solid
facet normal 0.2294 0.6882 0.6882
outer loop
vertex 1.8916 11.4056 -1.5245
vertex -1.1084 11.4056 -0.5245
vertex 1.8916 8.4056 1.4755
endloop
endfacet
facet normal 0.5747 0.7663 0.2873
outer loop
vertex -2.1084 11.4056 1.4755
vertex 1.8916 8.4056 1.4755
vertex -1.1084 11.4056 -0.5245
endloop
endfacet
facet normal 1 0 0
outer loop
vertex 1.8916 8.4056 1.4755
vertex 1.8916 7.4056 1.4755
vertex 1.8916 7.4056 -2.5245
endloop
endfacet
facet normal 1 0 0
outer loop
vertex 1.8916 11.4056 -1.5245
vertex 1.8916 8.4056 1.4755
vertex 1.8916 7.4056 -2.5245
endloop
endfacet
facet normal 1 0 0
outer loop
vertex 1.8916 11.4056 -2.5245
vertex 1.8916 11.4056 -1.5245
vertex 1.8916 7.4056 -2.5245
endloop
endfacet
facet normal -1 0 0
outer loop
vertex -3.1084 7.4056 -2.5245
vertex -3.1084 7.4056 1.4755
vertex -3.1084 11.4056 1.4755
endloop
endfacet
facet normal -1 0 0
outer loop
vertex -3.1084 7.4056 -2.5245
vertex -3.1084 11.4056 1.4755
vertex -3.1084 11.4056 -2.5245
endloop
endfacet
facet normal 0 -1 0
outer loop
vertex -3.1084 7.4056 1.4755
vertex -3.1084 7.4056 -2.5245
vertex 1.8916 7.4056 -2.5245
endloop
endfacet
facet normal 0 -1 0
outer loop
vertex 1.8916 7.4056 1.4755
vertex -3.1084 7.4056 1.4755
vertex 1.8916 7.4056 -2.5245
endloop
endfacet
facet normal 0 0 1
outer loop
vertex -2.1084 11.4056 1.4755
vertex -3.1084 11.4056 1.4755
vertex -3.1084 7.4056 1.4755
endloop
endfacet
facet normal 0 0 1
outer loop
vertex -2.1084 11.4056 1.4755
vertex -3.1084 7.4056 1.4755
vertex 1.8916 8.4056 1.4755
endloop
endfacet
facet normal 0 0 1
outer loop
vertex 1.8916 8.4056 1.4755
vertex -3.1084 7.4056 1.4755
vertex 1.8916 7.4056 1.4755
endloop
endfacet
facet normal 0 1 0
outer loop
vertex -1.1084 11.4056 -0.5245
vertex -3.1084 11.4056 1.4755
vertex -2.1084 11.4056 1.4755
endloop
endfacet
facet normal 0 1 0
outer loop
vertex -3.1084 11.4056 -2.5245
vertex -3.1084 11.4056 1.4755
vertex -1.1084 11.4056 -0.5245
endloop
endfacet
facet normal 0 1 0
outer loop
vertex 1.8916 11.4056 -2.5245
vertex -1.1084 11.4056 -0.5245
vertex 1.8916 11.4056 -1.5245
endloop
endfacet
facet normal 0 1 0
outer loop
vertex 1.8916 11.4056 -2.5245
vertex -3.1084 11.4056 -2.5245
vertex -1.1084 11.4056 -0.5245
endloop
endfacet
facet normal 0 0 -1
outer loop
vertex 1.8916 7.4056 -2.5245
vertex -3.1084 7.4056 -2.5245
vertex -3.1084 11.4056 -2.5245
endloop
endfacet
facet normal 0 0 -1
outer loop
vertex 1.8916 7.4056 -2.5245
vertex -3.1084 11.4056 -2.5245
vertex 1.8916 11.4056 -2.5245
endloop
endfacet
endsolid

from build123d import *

# Parameters (mm, degrees)
SKETCH_1_W          = 25
SKETCH_1_H          = 20
EXTRUDE_1_DEPTH     = 20
CUT_EXTRUDE_1_DEPTH = 20
CUT_EXTRUDE_5_DEPTH = 20
SCALE_1_SCALE       = 0.2


with BuildPart() as part:
    # 草圖1 → 填料-伸長1 (new body)
    with BuildSketch(Plane(origin=(0, 0, 0), x_dir=(1, 0, 0), z_dir=(0, 1, 0))):
        Rectangle(SKETCH_1_W, SKETCH_1_H)
    extrude(amount=EXTRUDE_1_DEPTH)

    # 草圖5 → 除料-伸長1 (cut)
    with BuildSketch(Plane(origin=(7.981651376, 10.642201835, 3.990825688), x_dir=(-0.818367137, 0.538104419, 0.201789157), z_dir=(-0.574695771, -0.766261028, -0.287347886))):
        Polygon((-5.521175546, -7.607674568), (18.917733471, -2.340822944), (12.808006217, 7.022468832), align=None)
    extrude(amount=-CUT_EXTRUDE_1_DEPTH, mode=Mode.SUBTRACT)

    # 草圖7 → 除料-伸長5 (cut)
    with BuildSketch(Plane(origin=(3.026315789, 9.078947368, 9.078947368), x_dir=(0.973328527, -0.162221421, -0.162221421), z_dir=(0.229415734, 0.688247202, 0.688247202))):
        Polygon((9.733285268, -3.535533906), (9.733285268, 17.67766953), (-5.67774974, 14.142135624), align=None)
    extrude(amount=CUT_EXTRUDE_5_DEPTH, mode=Mode.SUBTRACT)


with BuildPart() as part_1:
    # 縮放比例1: scaled about (-0.76048951, 9.256993007, -0.655594406)
    add(part.part.scale(SCALE_1_SCALE).moved(Location((-0.608391608, 7.405594406, -0.524475525))))


solid = part_1.part
